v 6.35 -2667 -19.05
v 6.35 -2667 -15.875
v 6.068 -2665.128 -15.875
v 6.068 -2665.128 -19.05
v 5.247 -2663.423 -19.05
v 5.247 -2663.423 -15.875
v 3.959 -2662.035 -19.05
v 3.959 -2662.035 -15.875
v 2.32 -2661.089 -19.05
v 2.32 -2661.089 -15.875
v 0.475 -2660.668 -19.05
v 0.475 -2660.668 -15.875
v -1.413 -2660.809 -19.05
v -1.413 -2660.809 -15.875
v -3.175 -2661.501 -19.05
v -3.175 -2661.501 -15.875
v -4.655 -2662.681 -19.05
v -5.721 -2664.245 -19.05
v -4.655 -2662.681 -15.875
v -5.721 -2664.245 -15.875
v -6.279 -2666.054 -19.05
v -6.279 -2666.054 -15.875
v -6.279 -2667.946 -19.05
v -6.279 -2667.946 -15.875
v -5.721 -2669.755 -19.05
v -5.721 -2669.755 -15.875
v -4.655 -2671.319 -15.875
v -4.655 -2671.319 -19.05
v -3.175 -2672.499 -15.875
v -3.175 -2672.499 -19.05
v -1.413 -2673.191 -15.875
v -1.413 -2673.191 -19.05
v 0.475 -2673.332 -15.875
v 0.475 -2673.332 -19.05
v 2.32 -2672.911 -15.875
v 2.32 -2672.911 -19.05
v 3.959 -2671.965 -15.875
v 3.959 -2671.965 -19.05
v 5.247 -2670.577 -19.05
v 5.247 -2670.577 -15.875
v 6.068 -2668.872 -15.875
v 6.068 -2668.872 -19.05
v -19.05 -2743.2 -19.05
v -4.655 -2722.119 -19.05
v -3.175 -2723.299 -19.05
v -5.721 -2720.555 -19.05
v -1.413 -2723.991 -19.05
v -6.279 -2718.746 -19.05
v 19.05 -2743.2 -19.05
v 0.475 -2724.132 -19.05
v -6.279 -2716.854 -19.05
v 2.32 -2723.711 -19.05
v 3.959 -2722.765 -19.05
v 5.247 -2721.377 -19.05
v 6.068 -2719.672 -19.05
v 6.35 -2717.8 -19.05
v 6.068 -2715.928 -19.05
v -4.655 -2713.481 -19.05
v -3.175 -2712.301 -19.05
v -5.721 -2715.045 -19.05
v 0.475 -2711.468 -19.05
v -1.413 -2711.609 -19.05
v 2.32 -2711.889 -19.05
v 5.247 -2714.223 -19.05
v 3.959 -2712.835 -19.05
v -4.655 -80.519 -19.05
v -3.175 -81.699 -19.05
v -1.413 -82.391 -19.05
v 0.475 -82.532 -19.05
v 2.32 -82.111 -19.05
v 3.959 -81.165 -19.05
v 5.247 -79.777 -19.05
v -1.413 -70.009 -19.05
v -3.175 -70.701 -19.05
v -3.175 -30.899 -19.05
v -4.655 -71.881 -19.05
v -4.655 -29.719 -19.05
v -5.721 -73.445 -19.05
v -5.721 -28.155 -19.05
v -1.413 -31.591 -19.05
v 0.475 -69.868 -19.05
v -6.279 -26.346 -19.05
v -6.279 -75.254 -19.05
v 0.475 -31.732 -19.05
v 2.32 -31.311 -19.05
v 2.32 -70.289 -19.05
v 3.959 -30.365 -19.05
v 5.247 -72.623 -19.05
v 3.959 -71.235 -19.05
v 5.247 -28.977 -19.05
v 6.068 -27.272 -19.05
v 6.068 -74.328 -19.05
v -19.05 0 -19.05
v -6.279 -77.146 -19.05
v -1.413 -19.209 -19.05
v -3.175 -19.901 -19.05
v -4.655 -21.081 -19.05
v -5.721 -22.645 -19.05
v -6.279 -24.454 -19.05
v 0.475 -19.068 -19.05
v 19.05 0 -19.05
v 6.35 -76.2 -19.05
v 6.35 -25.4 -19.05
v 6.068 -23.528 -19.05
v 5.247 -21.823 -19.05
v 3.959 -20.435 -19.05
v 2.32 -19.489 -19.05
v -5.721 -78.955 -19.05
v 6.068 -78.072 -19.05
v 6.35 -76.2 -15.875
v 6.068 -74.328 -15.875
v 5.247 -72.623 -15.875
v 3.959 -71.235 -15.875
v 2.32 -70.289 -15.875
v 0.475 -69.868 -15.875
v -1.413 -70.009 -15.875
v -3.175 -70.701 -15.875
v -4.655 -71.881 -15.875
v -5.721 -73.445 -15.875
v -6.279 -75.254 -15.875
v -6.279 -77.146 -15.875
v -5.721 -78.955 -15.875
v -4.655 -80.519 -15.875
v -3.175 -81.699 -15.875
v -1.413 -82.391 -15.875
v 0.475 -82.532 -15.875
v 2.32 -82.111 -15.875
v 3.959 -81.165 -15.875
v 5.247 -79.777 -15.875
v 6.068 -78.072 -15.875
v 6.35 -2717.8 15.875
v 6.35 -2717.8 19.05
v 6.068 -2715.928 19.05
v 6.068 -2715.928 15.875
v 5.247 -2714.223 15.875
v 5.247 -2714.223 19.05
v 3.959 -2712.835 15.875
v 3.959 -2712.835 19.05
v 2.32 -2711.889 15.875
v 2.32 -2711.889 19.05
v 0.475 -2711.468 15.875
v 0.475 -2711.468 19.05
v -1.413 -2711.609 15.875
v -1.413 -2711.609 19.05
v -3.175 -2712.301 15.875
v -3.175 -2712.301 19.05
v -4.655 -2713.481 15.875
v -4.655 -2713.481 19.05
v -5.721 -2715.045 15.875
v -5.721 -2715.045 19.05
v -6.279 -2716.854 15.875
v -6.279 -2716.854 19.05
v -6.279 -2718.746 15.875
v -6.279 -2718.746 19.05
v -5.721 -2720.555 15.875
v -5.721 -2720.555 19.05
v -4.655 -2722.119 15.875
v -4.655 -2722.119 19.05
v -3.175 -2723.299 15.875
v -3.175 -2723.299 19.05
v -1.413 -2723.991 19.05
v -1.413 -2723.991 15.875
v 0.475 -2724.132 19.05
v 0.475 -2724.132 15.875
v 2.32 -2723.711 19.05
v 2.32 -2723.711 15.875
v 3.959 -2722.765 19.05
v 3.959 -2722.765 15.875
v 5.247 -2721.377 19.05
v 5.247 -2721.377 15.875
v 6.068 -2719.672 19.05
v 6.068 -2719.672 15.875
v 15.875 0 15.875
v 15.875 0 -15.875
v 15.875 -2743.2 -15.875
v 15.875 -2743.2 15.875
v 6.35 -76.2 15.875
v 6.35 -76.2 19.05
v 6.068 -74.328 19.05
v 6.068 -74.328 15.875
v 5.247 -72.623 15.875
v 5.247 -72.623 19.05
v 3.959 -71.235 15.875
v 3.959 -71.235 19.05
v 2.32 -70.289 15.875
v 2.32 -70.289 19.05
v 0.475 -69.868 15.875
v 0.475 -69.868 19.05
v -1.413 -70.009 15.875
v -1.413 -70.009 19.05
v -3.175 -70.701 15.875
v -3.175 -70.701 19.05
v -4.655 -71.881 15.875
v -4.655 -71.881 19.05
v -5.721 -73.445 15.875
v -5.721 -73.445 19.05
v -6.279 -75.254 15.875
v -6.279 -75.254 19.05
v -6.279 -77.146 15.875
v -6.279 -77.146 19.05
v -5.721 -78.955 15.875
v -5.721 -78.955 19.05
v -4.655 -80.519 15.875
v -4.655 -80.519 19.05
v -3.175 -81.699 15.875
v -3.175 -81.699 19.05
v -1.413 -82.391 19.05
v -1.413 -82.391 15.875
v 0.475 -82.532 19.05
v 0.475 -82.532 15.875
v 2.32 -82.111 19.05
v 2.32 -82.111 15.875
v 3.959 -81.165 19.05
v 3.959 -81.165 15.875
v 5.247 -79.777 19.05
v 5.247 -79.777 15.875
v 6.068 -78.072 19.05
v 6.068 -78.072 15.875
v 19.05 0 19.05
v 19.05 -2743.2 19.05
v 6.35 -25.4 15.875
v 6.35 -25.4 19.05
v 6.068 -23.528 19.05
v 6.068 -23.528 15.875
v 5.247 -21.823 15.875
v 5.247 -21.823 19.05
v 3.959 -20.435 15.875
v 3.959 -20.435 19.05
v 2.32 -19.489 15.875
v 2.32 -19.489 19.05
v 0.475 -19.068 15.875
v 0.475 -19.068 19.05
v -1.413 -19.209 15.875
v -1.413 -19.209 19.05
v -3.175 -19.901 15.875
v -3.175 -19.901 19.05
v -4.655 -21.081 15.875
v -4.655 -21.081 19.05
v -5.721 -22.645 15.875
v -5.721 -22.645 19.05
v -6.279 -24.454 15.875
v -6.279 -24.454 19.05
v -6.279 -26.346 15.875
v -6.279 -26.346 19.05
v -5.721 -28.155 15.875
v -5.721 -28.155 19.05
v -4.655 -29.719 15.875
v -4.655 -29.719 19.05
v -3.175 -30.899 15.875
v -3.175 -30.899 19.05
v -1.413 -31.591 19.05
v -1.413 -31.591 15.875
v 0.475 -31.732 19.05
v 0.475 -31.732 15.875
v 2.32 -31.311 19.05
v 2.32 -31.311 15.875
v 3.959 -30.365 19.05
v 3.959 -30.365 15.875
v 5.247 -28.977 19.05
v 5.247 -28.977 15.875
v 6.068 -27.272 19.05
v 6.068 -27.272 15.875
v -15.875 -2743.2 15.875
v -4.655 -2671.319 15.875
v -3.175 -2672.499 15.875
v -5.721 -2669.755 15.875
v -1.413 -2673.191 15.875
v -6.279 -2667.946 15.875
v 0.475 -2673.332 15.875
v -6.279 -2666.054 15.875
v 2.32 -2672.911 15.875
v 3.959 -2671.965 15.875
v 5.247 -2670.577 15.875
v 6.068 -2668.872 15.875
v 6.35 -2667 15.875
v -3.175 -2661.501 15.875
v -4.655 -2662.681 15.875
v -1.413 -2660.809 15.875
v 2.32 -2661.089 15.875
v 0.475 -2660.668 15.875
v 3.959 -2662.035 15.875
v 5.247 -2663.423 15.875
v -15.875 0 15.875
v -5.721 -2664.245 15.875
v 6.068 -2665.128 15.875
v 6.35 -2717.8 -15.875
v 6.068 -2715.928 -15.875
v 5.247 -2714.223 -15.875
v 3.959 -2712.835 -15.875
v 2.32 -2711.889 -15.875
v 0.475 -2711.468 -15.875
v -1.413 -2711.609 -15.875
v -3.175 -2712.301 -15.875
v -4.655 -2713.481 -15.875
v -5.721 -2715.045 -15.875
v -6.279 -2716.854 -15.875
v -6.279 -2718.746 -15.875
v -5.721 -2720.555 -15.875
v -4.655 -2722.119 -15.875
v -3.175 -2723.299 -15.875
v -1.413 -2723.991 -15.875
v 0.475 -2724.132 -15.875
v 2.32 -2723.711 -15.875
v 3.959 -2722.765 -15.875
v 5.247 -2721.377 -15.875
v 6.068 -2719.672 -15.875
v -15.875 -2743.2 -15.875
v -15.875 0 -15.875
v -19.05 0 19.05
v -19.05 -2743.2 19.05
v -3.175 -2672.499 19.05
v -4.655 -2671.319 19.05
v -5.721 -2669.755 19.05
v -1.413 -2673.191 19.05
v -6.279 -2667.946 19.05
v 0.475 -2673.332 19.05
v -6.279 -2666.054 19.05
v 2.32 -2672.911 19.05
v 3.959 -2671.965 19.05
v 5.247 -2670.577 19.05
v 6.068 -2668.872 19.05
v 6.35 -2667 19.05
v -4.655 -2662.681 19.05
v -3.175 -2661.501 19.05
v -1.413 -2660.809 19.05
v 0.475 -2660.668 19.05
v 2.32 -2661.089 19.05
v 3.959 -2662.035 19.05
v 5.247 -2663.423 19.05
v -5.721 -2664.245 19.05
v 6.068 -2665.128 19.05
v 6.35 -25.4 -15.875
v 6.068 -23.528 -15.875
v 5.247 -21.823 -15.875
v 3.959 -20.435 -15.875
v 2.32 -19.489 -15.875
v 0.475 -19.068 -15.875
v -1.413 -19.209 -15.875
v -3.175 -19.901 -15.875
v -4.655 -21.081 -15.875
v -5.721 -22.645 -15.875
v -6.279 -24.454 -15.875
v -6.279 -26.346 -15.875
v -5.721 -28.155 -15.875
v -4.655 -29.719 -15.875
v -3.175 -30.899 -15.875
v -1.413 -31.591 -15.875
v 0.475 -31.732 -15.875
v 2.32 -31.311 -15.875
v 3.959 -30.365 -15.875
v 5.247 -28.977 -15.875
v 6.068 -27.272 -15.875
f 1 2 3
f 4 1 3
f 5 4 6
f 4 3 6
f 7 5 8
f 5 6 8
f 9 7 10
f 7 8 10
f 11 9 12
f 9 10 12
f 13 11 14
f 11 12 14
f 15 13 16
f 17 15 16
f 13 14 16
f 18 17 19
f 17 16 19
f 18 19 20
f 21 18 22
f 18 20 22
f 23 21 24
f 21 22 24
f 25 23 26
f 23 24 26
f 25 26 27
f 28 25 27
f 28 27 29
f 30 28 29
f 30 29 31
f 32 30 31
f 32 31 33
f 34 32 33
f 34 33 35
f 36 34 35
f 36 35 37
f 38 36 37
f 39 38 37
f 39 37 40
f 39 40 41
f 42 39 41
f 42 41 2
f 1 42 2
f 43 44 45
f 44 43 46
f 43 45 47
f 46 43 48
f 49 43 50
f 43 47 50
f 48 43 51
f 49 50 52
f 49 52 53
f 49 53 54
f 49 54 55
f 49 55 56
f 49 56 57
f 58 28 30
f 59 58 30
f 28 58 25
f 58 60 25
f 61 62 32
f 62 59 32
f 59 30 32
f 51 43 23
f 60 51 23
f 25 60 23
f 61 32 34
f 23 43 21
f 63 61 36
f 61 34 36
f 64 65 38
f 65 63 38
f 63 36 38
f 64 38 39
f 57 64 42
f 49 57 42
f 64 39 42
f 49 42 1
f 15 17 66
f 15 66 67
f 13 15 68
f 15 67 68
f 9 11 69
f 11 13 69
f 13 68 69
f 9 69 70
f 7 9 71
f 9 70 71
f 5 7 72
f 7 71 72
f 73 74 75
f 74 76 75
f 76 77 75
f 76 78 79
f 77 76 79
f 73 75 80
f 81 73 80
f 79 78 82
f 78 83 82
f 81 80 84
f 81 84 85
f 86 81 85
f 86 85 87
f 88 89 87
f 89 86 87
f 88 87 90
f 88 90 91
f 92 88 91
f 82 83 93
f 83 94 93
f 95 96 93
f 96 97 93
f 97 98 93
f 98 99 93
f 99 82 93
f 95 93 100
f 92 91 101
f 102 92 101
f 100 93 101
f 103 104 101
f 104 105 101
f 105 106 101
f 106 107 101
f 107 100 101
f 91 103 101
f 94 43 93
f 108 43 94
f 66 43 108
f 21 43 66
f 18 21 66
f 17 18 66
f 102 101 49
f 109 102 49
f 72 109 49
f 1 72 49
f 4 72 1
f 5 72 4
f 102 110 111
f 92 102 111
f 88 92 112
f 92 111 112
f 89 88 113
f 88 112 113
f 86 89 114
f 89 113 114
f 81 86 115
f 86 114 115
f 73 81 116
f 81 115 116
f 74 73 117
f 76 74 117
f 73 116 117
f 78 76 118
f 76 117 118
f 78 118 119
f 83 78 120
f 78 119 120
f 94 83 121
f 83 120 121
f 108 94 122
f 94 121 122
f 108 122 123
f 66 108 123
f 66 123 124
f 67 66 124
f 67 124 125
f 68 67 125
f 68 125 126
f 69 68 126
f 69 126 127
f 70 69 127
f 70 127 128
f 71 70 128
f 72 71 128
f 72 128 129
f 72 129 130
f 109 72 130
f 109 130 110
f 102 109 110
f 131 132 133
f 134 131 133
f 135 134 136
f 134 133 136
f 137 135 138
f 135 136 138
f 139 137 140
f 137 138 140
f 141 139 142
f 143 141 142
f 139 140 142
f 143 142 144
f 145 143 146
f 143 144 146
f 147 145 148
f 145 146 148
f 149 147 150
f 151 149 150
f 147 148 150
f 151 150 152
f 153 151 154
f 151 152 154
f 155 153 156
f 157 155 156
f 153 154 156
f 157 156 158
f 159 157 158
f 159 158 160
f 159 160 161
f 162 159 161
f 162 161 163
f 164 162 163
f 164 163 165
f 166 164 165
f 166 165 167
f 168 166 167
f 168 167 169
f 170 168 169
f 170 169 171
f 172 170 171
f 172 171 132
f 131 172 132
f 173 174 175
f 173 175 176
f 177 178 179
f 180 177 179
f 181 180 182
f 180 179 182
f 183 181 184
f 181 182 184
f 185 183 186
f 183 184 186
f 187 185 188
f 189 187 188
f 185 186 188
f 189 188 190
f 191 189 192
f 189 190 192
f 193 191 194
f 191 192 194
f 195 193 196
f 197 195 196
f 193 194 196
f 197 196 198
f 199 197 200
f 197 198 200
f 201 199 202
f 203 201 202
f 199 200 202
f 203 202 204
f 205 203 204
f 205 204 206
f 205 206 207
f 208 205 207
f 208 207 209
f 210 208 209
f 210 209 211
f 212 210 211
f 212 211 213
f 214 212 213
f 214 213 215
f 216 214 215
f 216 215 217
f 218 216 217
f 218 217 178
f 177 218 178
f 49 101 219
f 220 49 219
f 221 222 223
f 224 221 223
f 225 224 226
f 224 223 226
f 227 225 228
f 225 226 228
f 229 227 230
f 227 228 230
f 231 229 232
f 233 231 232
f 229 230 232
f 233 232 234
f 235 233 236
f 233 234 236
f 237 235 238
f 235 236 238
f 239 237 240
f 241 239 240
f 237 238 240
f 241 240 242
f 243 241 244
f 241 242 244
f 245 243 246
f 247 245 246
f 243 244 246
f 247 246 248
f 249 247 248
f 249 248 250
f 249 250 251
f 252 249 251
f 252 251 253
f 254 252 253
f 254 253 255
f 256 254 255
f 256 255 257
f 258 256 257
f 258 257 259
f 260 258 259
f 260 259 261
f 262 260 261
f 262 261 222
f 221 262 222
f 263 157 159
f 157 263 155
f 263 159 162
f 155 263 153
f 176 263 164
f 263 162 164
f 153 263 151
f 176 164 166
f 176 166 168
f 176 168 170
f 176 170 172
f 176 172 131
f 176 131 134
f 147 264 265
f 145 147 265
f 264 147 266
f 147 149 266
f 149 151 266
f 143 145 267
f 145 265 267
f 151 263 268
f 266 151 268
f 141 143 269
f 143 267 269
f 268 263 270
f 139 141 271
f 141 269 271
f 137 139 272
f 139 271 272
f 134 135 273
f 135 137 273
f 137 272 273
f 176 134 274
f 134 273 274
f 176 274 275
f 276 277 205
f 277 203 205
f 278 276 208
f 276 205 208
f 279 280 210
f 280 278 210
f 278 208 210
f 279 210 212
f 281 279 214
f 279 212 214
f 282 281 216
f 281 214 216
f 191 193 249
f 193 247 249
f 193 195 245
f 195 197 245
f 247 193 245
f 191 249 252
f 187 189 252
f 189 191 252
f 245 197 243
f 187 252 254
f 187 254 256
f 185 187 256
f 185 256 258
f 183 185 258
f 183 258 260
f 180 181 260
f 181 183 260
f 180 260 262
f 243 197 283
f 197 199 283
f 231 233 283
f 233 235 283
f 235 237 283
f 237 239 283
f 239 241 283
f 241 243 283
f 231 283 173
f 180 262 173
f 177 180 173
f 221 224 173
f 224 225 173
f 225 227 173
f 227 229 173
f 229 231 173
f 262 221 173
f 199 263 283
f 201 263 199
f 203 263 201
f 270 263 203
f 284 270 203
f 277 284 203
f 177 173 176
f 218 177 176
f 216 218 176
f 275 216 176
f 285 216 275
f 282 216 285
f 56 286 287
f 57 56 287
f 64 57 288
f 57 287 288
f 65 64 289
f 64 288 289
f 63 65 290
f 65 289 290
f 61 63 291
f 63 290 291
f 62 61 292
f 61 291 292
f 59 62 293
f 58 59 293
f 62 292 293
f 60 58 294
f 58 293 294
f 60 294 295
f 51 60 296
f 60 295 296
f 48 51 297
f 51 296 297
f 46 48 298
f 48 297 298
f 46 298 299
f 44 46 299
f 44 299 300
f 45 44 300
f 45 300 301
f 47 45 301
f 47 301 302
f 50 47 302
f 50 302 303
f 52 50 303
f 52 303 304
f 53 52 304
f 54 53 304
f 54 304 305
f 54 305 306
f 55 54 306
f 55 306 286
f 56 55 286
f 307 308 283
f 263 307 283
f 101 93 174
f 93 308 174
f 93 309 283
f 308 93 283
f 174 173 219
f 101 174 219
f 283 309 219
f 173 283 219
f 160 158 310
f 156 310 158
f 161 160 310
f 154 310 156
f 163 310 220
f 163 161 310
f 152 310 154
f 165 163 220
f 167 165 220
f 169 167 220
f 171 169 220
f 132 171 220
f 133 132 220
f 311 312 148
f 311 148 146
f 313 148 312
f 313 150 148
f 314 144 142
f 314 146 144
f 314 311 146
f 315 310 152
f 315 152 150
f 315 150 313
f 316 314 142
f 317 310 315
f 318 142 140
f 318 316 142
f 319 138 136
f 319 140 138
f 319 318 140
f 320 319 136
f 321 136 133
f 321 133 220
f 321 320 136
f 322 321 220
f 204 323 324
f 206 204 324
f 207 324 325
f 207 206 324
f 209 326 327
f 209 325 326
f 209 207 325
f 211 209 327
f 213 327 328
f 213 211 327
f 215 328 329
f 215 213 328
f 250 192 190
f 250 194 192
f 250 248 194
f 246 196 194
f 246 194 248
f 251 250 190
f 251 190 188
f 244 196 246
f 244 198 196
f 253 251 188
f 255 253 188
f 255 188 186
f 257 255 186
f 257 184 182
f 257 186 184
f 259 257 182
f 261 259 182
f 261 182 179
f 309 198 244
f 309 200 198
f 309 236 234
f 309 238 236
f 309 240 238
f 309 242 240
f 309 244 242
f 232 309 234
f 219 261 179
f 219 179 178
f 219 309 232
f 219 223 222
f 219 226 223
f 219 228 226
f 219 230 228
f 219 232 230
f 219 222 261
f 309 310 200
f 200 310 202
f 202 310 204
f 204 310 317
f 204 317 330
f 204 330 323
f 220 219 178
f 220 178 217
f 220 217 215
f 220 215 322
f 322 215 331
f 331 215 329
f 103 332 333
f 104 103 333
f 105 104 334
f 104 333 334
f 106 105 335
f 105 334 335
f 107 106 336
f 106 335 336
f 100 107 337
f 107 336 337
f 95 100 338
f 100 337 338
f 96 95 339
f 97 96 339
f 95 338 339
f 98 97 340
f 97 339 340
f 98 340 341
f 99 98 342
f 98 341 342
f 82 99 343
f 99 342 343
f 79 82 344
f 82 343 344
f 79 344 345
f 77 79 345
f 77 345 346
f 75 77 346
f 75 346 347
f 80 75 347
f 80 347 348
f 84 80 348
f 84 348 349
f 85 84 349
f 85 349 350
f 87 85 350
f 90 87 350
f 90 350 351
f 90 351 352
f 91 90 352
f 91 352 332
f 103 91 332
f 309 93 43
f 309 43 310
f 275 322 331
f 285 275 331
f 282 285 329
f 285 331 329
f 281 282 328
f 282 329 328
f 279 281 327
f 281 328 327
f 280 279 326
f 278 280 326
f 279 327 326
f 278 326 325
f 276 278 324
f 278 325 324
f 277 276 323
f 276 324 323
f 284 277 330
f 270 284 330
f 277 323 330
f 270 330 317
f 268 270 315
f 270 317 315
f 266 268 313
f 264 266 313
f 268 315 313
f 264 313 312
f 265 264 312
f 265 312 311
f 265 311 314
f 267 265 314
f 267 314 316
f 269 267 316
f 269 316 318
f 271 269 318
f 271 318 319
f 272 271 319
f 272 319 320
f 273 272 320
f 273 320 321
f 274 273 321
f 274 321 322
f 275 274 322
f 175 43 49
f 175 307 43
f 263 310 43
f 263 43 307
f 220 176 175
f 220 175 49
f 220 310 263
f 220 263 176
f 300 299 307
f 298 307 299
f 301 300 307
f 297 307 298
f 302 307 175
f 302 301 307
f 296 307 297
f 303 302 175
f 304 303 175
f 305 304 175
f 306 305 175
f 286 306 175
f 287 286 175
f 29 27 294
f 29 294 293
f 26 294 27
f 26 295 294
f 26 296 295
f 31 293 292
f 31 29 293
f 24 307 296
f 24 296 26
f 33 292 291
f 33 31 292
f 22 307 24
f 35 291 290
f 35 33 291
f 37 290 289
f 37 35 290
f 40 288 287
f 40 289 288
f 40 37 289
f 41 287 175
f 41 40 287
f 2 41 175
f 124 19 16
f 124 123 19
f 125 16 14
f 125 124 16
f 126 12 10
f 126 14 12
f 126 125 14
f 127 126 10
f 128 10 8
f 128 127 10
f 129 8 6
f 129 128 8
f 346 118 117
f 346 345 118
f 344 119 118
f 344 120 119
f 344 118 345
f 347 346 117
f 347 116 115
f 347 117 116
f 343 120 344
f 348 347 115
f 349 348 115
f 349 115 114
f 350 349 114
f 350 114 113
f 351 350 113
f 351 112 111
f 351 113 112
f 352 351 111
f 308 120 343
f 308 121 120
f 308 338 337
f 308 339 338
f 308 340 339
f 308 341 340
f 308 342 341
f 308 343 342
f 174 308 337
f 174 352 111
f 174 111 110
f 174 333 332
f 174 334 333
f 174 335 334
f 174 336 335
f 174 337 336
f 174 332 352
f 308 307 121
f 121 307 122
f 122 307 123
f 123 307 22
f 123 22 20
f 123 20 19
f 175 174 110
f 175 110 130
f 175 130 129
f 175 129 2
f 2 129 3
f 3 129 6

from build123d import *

# Parameters (mm, degrees)
F0_W     = 38.1
F0_H     = 38.1
F0_W_2   = 31.75
F0_H_2   = 31.75
F1_DEPTH = 2743.2
F2_R     = 6.35
F3_DEPTH = 38.101


# Not quite as in the source:
# - a feature names something its author has since deleted; it is built from what else it names


with BuildPart() as f1:
    # F0 (on Front) → F1 (new body)
    with BuildSketch(Plane.XZ):
        Rectangle(F0_W, F0_H)
        Rectangle(F0_W_2, F0_H_2, mode=Mode.SUBTRACT)
    extrude(amount=F1_DEPTH)

    # F2 (on face) → F3 (cut, through all)
    with BuildSketch(Plane.XY.offset(19.05)):
        with Locations((0, -25.4)):
            Circle(F2_R)
        with Locations((0, -76.2)):
            Circle(F2_R)
        with Locations((0, -2717.8)):
            Circle(F2_R)
        with Locations((0, -2667)):
            Circle(F2_R)
    extrude(amount=-F3_DEPTH, mode=Mode.SUBTRACT)


solid = f1.part
